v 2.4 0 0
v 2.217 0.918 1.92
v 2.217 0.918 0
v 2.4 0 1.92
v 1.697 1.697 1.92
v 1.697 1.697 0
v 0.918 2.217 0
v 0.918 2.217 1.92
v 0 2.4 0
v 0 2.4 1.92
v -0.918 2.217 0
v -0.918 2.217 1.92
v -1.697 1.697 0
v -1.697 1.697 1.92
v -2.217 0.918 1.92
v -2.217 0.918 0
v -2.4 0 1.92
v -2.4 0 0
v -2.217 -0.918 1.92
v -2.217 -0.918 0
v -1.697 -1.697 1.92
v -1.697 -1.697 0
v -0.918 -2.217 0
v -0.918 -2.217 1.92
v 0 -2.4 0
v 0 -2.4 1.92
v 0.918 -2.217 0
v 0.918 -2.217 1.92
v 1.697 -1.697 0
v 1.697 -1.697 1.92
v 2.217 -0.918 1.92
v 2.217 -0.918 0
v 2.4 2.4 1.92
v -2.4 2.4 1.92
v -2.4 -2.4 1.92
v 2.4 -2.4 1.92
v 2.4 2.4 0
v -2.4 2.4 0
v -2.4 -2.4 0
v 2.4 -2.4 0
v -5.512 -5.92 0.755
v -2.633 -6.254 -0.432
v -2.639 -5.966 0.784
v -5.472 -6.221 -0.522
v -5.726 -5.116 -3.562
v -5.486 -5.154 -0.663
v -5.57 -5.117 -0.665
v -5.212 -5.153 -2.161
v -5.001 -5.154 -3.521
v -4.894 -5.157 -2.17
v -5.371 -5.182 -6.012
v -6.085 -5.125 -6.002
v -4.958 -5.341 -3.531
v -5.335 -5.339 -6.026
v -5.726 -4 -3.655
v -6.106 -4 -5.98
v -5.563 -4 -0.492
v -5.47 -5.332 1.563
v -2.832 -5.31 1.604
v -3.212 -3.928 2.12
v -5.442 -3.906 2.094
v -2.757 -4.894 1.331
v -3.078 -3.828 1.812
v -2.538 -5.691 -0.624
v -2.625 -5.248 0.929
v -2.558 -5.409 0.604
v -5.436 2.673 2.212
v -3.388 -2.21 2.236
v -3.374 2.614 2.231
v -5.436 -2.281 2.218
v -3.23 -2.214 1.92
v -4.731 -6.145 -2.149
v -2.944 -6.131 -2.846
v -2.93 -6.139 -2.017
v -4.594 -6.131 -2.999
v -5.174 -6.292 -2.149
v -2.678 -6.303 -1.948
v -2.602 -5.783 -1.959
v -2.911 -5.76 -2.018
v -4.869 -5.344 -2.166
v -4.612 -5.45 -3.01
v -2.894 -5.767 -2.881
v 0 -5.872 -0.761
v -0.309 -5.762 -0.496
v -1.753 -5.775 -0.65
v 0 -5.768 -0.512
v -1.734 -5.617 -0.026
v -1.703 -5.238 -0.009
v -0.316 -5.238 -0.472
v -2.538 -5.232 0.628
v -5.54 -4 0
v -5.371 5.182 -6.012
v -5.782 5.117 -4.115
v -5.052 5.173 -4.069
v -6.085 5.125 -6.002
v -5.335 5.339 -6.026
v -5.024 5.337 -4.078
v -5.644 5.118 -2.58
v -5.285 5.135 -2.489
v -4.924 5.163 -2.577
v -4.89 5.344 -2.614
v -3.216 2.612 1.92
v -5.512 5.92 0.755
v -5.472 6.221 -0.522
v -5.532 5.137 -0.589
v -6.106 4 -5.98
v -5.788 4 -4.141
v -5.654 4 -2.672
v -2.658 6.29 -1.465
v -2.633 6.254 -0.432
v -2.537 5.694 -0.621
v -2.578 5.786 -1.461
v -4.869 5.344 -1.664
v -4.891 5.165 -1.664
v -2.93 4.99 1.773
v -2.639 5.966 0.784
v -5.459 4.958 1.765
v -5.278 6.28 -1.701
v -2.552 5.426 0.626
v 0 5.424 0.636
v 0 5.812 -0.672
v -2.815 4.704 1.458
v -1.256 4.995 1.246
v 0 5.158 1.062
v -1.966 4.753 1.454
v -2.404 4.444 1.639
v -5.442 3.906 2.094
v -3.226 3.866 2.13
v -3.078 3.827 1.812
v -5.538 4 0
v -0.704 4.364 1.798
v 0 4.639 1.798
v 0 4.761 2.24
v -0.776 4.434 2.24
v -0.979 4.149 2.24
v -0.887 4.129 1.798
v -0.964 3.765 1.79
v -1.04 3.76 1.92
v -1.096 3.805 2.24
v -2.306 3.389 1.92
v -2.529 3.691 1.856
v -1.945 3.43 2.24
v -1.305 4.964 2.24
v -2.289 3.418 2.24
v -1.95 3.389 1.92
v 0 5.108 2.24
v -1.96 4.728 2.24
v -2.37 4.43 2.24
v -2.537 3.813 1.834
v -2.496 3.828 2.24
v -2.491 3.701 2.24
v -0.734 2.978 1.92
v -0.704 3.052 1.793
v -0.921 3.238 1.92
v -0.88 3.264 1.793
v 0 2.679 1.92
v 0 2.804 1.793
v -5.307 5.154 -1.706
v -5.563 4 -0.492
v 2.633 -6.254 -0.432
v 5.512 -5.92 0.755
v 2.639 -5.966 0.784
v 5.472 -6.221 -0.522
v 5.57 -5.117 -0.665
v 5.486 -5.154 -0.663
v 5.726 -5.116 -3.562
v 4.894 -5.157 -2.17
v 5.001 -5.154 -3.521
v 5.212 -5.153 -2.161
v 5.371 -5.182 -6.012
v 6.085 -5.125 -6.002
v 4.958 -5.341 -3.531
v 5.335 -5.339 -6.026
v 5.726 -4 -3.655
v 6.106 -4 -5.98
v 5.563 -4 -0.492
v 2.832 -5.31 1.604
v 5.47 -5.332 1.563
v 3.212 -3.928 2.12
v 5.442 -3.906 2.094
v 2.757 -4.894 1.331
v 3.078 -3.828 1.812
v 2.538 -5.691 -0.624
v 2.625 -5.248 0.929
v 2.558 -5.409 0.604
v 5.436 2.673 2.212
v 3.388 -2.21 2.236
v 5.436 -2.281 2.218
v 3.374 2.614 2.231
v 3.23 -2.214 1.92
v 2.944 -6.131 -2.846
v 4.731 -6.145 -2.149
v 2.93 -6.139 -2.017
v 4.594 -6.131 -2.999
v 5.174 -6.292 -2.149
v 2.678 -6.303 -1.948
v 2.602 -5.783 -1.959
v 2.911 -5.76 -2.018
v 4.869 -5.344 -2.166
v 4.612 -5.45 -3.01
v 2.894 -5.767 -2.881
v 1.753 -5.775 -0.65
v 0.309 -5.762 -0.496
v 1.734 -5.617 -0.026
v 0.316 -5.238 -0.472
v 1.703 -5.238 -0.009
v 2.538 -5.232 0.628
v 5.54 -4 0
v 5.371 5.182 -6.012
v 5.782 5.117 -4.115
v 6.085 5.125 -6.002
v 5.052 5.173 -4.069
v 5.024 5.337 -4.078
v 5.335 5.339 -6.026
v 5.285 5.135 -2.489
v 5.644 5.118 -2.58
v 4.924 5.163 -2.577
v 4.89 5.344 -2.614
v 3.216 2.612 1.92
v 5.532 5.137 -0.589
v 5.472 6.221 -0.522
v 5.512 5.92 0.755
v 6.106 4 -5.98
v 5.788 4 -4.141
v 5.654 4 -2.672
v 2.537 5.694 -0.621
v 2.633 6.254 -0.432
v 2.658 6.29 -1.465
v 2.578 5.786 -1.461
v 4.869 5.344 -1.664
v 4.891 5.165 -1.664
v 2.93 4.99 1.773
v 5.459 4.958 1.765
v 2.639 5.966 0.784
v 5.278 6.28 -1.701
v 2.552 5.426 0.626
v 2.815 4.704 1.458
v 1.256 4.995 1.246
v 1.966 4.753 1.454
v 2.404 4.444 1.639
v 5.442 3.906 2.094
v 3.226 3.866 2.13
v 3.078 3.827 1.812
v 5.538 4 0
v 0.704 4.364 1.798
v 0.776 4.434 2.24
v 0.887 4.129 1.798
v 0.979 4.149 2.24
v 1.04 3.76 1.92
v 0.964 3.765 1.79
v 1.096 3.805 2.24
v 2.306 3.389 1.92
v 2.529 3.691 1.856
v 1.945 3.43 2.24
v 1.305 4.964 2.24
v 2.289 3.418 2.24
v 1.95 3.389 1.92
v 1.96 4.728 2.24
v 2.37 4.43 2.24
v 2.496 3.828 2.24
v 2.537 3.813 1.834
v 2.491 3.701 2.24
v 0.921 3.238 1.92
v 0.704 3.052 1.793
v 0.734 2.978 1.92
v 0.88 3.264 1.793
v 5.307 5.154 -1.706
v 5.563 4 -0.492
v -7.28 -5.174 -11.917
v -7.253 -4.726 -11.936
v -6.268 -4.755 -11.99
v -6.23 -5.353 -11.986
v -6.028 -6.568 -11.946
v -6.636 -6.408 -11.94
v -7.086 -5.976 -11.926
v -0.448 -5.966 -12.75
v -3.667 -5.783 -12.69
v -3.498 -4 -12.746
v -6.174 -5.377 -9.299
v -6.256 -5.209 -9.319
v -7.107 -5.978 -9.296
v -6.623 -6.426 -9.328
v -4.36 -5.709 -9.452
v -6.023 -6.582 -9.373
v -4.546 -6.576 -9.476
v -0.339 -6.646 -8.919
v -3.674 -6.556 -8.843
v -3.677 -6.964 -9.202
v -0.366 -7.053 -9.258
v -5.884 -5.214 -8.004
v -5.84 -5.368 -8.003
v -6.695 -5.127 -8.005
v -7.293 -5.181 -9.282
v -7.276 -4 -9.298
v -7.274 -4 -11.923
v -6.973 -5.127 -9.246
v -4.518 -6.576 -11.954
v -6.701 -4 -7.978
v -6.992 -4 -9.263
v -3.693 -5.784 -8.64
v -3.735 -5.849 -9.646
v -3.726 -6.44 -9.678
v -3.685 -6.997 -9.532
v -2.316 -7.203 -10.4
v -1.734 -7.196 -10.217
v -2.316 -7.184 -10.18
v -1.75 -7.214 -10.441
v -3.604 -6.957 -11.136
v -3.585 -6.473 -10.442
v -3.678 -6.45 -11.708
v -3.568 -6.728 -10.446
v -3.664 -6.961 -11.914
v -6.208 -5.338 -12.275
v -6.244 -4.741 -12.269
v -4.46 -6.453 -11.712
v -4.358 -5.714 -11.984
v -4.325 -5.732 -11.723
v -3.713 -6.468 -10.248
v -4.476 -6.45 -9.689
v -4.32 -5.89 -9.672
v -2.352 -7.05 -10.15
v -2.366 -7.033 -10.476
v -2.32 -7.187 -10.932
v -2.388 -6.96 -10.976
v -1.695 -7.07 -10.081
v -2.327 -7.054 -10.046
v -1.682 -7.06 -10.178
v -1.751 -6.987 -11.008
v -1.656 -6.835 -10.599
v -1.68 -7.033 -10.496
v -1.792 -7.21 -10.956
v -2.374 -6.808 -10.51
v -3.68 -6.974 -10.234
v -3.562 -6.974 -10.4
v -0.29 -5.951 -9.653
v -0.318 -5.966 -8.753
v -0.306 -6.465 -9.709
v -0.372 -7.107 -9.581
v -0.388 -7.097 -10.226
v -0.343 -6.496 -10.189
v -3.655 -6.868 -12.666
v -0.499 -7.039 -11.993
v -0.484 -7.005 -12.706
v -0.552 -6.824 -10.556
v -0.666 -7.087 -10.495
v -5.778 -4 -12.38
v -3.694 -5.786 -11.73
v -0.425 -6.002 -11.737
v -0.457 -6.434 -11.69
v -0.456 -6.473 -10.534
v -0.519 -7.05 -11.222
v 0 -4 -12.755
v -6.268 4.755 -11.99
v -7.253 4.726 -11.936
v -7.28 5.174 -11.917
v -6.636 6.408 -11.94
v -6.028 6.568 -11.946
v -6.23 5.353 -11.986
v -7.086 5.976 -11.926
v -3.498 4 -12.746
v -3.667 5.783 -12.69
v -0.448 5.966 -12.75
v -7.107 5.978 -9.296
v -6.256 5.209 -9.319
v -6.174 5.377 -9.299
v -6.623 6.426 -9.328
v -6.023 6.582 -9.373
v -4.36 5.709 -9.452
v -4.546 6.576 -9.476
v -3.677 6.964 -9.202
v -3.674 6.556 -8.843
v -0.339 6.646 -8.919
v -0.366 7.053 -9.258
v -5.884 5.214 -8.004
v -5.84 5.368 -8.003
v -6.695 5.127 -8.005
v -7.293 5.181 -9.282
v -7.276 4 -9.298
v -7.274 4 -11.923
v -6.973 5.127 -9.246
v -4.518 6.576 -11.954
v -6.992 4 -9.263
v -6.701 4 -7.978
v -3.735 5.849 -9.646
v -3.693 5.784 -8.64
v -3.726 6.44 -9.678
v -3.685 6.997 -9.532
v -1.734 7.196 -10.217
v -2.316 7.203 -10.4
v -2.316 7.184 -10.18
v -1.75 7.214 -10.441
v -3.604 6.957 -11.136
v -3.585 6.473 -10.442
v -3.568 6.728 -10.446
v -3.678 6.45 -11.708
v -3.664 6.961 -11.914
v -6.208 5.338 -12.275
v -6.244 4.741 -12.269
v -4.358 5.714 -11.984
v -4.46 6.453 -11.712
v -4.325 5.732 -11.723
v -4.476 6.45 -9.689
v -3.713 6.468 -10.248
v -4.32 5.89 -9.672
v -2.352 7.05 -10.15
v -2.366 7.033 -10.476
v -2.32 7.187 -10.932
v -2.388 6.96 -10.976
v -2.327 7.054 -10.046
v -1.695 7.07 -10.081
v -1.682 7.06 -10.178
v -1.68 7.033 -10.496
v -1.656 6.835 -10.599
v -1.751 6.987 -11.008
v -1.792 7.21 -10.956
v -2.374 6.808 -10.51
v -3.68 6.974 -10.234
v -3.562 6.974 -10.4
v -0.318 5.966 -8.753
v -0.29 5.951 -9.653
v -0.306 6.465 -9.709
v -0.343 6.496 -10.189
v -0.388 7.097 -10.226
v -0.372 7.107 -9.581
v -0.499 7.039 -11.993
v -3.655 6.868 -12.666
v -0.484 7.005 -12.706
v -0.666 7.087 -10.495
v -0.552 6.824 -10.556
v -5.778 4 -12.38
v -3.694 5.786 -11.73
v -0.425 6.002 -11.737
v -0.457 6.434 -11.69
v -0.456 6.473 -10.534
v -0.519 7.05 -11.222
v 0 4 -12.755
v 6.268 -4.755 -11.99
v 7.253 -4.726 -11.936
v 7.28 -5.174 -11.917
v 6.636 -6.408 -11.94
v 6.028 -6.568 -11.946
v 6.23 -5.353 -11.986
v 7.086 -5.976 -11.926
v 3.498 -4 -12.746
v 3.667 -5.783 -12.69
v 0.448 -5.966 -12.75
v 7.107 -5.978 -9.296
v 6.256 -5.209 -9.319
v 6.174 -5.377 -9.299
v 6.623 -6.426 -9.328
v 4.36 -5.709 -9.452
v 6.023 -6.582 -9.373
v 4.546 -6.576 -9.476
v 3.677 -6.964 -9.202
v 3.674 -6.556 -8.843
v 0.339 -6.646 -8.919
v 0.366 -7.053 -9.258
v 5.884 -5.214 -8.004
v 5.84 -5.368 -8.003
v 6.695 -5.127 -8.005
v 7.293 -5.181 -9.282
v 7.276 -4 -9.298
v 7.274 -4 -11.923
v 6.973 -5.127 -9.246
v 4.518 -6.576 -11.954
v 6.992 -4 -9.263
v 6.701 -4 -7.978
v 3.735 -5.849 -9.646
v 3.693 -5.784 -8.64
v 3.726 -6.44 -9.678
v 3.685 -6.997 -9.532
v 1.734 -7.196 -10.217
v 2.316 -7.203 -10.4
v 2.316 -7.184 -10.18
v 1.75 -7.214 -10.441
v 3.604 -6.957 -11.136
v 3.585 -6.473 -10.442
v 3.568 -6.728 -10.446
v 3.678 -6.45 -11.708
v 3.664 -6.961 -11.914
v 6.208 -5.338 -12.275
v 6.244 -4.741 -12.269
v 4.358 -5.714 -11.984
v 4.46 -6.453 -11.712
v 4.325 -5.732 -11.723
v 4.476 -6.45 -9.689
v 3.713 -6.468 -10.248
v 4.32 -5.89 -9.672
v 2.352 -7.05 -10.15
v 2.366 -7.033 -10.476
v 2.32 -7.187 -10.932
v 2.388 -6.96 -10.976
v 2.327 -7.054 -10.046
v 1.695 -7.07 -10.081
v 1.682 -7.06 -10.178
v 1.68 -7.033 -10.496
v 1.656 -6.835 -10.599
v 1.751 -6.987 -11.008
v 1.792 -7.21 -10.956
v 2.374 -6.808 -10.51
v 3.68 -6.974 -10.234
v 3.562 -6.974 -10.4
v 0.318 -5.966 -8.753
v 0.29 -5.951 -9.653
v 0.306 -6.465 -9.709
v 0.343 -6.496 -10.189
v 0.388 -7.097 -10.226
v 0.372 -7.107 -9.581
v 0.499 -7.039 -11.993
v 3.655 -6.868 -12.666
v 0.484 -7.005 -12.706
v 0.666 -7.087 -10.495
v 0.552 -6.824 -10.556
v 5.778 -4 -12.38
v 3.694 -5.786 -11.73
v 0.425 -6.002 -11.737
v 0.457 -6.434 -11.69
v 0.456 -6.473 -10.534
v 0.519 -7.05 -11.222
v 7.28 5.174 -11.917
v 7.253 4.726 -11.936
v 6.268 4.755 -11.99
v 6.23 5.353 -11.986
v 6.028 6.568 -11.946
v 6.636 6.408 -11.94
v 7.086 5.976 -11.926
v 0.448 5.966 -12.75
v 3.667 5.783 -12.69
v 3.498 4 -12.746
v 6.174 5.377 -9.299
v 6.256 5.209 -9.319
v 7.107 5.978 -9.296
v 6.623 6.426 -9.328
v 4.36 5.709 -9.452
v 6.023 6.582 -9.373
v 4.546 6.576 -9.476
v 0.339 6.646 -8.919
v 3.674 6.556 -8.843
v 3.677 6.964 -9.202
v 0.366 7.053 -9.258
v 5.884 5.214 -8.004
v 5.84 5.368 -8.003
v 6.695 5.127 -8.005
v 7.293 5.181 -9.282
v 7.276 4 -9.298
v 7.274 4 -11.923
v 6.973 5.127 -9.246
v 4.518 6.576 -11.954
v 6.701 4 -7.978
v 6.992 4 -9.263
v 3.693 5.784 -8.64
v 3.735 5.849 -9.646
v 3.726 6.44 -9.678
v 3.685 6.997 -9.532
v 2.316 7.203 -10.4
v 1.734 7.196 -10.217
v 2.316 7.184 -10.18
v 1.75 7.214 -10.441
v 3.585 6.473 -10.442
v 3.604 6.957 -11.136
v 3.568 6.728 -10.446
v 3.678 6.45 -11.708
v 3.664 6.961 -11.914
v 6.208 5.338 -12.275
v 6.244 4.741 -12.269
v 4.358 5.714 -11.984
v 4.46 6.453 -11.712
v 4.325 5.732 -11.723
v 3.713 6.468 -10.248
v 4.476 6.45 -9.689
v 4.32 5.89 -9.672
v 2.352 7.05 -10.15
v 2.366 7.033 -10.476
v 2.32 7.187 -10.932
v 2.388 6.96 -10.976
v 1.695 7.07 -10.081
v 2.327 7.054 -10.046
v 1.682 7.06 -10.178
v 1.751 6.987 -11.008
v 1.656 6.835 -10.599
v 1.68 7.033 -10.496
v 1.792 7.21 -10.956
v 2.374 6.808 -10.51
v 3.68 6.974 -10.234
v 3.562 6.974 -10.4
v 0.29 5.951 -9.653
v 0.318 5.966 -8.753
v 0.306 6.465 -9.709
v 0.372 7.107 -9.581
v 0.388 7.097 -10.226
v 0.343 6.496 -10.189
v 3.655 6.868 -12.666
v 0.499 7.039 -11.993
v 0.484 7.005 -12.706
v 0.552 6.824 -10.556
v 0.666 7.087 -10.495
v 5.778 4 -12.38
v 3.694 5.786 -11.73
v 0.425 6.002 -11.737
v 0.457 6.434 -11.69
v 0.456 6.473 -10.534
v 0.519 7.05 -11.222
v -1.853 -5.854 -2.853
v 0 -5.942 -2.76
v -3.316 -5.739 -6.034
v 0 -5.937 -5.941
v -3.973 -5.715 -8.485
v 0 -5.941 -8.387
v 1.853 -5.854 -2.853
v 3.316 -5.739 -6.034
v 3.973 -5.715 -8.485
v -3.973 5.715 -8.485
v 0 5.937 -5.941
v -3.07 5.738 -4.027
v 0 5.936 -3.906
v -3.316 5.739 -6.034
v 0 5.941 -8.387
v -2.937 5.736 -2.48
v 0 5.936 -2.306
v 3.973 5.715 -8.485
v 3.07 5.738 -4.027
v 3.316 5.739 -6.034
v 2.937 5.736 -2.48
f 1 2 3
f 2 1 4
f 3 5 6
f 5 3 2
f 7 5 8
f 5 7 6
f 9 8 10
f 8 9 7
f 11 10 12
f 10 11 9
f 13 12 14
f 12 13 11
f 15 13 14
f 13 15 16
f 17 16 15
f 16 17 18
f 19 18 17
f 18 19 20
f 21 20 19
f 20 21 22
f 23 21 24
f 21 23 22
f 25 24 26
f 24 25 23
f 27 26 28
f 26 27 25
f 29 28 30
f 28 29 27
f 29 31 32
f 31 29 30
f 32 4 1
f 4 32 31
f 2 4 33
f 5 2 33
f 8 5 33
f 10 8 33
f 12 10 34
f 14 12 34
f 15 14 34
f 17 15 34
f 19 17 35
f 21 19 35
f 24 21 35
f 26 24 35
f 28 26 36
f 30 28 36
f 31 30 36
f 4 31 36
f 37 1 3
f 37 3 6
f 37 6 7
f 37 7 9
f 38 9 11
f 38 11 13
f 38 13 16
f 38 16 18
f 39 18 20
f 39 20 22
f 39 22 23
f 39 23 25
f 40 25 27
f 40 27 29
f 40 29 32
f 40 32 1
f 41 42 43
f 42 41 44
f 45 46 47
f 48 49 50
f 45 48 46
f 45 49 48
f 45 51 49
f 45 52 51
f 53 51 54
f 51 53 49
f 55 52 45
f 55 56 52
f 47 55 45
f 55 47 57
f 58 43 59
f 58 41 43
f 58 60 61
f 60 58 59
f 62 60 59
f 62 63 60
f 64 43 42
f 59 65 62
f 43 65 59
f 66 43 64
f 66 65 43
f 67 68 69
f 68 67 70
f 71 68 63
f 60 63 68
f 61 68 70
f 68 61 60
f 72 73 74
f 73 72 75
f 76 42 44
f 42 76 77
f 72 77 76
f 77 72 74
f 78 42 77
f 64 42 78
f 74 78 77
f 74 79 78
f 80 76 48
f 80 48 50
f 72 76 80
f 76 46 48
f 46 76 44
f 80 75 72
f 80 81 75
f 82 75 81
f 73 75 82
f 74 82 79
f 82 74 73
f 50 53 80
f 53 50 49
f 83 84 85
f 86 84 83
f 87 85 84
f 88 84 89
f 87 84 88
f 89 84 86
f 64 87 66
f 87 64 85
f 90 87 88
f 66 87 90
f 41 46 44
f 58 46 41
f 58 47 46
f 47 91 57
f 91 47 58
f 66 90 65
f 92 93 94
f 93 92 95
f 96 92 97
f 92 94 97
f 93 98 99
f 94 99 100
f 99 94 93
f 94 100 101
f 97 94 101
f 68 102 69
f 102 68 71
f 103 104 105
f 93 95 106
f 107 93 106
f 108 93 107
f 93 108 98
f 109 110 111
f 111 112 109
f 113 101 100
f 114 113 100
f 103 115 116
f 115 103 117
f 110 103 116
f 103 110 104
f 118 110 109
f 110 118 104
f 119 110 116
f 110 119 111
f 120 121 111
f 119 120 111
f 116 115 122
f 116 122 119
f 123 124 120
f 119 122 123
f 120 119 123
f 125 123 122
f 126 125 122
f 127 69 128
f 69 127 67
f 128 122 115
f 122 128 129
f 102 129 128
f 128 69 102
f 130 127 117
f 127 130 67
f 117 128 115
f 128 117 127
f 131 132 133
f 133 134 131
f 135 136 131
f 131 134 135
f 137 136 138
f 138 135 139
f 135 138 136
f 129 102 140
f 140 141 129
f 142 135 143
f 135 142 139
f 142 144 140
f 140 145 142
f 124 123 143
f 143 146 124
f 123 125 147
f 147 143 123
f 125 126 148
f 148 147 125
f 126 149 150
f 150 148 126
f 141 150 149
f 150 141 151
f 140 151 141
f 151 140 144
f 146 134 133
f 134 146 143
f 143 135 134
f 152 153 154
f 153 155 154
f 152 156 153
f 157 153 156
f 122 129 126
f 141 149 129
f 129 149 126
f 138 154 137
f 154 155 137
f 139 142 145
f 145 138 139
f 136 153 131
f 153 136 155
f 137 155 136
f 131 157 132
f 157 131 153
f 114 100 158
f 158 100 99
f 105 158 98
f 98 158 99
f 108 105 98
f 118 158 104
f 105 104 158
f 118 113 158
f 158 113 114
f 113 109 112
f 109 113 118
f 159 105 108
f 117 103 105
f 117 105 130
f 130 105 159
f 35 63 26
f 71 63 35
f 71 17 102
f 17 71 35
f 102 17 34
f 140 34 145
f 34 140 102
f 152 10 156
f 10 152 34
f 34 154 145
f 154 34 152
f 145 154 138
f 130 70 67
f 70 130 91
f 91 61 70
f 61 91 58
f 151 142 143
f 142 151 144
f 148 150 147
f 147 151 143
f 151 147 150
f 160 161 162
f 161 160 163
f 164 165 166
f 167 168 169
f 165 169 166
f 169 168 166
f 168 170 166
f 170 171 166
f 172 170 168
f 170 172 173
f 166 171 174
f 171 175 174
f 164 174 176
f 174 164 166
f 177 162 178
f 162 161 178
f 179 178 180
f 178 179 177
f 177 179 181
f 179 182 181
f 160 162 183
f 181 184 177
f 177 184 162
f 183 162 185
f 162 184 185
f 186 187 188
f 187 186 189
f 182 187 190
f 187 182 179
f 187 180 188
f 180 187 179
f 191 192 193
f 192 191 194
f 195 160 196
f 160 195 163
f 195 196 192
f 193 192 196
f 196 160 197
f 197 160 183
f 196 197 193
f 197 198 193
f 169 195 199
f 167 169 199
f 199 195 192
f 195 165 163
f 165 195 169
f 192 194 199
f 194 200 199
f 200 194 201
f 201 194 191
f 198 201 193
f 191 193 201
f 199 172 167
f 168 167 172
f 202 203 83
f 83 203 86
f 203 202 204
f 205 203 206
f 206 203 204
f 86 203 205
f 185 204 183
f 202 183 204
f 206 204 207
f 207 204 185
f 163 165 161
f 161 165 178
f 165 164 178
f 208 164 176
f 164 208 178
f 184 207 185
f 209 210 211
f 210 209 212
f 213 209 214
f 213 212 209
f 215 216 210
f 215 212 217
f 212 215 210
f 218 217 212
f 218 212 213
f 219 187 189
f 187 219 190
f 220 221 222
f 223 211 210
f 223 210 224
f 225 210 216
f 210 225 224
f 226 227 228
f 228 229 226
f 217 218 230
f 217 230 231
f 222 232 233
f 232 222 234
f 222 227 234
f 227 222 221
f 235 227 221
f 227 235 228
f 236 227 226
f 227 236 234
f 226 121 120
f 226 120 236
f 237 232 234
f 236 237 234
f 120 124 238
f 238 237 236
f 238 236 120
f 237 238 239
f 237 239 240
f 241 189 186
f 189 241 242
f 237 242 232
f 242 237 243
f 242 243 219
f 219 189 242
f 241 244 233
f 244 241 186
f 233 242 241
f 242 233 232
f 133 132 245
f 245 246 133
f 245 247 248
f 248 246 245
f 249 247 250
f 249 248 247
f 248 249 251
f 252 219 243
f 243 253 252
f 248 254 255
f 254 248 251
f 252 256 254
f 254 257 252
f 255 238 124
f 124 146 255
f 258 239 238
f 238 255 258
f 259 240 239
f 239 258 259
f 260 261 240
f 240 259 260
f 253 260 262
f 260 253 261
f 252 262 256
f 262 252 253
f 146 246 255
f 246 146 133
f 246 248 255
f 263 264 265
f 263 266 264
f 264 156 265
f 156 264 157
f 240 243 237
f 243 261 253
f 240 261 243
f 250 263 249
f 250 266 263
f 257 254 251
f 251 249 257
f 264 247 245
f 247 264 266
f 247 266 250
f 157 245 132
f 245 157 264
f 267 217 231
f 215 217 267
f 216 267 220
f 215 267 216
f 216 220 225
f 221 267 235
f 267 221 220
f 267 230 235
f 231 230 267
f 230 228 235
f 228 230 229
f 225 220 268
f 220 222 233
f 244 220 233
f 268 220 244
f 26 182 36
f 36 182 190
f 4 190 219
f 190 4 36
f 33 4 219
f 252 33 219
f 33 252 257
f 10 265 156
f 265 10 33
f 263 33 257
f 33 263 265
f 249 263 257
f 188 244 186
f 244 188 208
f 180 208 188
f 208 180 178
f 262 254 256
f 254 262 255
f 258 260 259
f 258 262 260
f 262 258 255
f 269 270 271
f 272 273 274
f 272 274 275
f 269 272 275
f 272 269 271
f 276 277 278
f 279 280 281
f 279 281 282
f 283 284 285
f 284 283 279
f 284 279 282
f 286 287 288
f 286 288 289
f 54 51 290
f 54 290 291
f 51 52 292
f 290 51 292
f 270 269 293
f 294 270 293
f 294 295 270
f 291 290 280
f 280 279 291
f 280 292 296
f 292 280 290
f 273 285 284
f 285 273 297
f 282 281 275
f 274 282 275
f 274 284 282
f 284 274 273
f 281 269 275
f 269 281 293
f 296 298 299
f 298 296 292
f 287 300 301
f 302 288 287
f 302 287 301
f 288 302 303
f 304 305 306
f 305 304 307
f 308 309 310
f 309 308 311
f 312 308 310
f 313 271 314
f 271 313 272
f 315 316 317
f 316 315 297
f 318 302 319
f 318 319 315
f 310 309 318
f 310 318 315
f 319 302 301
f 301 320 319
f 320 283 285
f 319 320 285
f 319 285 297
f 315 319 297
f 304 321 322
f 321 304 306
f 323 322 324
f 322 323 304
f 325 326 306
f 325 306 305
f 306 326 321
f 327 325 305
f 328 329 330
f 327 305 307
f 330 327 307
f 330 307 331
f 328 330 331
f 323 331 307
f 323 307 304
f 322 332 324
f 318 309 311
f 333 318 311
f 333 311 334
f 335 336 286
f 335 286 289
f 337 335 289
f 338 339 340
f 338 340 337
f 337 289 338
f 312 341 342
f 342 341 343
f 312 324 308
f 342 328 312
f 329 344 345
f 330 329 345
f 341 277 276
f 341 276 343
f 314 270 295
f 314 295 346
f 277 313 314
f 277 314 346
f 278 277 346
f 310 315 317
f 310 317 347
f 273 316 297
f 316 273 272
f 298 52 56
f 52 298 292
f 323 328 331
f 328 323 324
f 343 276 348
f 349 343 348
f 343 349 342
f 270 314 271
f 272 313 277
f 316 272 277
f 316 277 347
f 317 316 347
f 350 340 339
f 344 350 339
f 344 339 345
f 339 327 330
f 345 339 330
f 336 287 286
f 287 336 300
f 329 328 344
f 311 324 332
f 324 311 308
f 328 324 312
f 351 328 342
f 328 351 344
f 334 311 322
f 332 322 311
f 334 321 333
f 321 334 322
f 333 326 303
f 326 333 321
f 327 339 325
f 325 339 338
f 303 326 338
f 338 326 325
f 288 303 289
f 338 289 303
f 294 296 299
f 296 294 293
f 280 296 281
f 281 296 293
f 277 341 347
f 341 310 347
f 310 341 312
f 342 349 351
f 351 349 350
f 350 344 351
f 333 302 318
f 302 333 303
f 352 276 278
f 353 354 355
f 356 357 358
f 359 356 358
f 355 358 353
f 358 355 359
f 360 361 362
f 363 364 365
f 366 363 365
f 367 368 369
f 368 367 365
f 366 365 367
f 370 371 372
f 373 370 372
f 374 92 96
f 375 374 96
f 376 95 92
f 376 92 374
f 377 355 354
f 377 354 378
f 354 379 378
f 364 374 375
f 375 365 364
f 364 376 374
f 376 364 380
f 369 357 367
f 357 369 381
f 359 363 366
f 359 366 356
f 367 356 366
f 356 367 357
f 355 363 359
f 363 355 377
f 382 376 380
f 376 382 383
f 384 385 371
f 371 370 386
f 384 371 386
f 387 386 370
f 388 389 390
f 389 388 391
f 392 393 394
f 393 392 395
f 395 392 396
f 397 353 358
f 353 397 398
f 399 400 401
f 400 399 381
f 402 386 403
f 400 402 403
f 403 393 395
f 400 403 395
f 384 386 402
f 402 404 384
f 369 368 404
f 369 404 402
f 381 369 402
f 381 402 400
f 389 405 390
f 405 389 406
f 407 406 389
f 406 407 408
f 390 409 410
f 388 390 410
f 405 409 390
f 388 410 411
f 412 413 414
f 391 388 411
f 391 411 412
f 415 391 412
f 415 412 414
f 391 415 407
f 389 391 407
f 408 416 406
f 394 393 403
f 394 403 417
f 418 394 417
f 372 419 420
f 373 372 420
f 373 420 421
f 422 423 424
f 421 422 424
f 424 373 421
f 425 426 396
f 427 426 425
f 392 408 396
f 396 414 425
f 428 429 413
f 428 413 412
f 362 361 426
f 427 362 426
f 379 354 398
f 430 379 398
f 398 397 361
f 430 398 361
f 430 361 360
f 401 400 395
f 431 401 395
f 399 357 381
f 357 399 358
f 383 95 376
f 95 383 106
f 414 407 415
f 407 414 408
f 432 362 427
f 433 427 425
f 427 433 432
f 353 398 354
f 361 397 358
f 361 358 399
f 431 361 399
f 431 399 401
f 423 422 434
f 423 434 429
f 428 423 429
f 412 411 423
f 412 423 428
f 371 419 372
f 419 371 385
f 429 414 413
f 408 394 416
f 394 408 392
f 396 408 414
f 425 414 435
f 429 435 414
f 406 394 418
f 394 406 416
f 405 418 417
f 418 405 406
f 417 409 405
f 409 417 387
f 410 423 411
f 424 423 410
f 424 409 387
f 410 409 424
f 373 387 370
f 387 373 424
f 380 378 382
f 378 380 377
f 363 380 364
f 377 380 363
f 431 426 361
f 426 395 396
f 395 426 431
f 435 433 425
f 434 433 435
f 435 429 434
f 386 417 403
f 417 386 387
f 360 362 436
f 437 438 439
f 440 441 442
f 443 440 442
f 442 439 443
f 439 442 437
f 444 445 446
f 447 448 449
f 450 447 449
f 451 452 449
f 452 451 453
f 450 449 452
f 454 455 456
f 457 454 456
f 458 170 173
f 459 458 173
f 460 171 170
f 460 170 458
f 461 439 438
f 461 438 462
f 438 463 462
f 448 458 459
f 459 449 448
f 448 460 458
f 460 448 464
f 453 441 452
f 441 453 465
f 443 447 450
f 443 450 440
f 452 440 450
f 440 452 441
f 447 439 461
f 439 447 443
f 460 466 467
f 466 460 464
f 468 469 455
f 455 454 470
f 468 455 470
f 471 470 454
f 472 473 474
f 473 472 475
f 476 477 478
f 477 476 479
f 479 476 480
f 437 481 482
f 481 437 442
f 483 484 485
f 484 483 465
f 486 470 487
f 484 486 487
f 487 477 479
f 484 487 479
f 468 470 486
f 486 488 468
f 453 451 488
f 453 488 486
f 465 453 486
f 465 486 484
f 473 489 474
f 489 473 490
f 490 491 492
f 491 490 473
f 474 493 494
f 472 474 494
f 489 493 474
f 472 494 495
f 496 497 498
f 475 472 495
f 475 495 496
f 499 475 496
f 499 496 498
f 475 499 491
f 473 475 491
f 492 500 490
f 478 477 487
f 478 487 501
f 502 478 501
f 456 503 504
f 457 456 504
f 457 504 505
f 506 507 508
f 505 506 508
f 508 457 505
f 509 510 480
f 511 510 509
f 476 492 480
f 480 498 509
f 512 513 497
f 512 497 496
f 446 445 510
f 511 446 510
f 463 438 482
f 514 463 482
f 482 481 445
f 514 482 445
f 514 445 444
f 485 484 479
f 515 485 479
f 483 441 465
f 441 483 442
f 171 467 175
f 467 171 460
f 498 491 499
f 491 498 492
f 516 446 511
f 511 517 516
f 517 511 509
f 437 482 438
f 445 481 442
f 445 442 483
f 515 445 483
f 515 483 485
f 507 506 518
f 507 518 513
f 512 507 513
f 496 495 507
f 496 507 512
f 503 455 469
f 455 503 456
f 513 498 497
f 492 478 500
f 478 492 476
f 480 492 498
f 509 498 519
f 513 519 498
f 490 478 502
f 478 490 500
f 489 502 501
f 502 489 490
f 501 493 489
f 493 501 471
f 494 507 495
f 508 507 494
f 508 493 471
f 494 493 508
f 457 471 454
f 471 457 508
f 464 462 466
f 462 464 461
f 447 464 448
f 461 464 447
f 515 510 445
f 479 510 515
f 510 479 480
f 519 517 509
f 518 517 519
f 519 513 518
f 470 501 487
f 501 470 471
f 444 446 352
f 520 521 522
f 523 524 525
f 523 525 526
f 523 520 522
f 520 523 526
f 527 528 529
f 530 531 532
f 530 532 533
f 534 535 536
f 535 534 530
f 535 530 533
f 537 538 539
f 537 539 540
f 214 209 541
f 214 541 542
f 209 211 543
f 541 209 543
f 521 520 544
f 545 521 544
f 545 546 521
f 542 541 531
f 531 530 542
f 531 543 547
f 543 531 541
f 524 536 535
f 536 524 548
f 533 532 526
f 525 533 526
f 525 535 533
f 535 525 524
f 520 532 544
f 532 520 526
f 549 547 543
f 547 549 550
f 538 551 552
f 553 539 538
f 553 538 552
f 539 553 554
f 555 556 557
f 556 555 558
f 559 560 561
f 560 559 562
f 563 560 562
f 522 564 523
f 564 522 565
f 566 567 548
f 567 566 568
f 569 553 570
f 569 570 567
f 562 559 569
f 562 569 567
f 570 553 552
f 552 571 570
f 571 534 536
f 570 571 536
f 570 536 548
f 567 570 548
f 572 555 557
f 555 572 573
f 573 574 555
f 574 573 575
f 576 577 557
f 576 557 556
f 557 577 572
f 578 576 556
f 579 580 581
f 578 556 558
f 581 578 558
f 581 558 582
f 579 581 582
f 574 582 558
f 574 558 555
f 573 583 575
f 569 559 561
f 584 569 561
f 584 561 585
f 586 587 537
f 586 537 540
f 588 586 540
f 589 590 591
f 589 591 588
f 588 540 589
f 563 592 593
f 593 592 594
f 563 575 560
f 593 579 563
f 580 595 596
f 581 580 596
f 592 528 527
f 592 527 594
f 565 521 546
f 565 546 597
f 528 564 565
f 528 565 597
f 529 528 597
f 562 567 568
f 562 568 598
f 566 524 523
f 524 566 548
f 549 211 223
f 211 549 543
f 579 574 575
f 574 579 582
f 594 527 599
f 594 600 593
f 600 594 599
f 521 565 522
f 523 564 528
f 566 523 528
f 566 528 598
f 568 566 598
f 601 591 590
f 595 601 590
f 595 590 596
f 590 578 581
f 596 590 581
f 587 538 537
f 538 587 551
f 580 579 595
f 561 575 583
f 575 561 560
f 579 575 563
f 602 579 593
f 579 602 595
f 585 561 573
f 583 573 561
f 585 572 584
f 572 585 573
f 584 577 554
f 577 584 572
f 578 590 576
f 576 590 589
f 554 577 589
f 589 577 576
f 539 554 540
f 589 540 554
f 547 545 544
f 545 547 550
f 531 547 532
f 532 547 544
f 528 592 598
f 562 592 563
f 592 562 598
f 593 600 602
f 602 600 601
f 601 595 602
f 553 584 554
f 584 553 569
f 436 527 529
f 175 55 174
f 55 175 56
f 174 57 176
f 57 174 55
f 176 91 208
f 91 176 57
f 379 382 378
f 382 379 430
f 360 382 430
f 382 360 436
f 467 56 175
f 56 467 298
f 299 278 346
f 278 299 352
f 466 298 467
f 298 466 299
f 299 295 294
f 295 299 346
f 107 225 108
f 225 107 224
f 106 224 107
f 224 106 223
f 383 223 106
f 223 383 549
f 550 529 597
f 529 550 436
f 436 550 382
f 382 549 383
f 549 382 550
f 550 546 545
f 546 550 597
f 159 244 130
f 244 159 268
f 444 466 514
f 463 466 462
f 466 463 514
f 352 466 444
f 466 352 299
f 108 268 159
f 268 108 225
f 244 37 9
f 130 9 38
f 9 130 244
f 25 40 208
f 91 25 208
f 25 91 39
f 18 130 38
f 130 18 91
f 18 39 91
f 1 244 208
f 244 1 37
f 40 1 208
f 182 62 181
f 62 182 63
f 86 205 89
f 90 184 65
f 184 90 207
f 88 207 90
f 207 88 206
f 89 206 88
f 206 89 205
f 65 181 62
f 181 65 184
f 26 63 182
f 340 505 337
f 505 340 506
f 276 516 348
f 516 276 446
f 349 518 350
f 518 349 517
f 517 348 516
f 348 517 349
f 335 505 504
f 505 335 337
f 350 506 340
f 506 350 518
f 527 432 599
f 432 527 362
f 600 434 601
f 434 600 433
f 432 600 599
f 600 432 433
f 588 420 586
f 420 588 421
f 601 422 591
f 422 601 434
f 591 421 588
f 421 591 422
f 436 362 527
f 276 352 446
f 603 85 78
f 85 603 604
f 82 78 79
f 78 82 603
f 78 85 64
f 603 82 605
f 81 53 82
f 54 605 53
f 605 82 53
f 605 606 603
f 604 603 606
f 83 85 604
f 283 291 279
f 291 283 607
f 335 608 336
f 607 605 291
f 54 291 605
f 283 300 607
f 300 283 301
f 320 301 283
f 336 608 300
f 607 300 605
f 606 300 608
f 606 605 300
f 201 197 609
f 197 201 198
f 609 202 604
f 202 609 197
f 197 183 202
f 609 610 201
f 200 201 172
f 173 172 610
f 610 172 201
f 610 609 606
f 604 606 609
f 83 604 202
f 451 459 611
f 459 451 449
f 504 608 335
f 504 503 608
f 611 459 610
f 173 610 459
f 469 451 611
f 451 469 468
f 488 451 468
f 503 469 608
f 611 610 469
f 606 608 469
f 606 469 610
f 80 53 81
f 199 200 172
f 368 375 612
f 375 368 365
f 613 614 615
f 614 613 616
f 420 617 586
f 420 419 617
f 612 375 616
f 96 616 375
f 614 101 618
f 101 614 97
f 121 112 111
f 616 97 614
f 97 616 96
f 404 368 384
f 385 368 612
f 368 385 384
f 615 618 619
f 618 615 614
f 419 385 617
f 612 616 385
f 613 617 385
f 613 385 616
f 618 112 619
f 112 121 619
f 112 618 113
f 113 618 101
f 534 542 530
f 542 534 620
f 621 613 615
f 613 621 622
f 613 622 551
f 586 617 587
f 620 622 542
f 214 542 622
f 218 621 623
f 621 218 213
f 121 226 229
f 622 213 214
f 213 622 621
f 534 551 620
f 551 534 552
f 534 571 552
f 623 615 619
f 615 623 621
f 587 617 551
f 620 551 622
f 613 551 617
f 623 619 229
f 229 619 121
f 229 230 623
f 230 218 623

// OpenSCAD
use <../lib.scad>
use <s/15423s01.scad>
$fa=1; $fs=0.2;
function ldraw_lib__15423(realsolid=false) = [
// 0 Minifig Body Armour Vest
// 0 Name: 15423.dat
// 0 Author: Evert-Jan Boer [ejboer]
// 0 !LDRAW_ORG Part UPDATE 2023-01
// 0 !LICENSE Licensed under CC BY 2.0 and CC BY 4.0 : see CAreadme.txt
// 
// 0 BFC CERTIFY CCW
  [0,"BFC","CERTIFY"],
  [0,"BFC","CCW"],
// 
// 0 !CATEGORY Minifig Neckwear
// 
// 0 !HISTORY 2014-05-16 {LEGO Digital Designer} Original part shape
// 0 !HISTORY 2021-02-11 [ejboer] File preparation for LDraw Parts Tracker
// 0 !HISTORY 2023-03-05 [OrionP] Official Update 2023-01
// 
// 
// 1 16 0 0 0 1 0 0 0 1 0 0 0 1 s\15423s01.dat
  [1,16,0,0,0,1,0,0,0,1,0,0,0,1, ldraw_lib__s__15423s01(realsolid)],
// 0 // Patternable Area Front
// 4 16 0 6.899 -14.855 -4.383 1.626 -14.438 -6.506 4.897 -14.457 -4.632 7.133 -14.636
  [4,16,0,6.899,-14.855,-4.383,1.626,-14.438,-6.506,4.897,-14.457,-4.632,7.133,-14.636],
// 4 16 -7.277 5.044 -14.4 -7.236 7.203 -14.418 -4.632 7.133 -14.636 -6.506 4.897 -14.457
  [4,16,-7.277,5.044,-14.4,-7.236,7.203,-14.418,-4.632,7.133,-14.636,-6.506,4.897,-14.457],
// 3 16 -6.506 4.897 -14.457 -4.383 1.626 -14.438 -6.345 1.561 -14.227
  [3,16,-6.506,4.897,-14.457,-4.383,1.626,-14.438,-6.345,1.561,-14.227],
// 3 16 -4.632 7.133 -14.636 -7.236 7.203 -14.418 -8.291 15.084 -14.347
  [3,16,-4.632,7.133,-14.636,-7.236,7.203,-14.418,-8.291,15.084,-14.347],
// 3 16 -11.529 7.526 -13.626 -12.395 8.827 -13.353 -7.236 7.203 -14.418
  [3,16,-11.529,7.526,-13.626,-12.395,8.827,-13.353,-7.236,7.203,-14.418],
// 3 16 -13.337 15.066 -13.348 -8.291 15.084 -14.347 -12.395 8.827 -13.353
  [3,16,-13.337,15.066,-13.348,-8.291,15.084,-14.347,-12.395,8.827,-13.353],
// 3 16 -8.291 15.084 -14.347 -7.236 7.203 -14.418 -12.395 8.827 -13.353
  [3,16,-8.291,15.084,-14.347,-7.236,7.203,-14.418,-12.395,8.827,-13.353],
// 3 16 -8.291 15.084 -14.347 0 14.852 -14.842 -4.632 7.133 -14.636
  [3,16,-8.291,15.084,-14.347,0,14.852,-14.842,-4.632,7.133,-14.636],
// 3 16 0 6.899 -14.855 -4.632 7.133 -14.636 0 14.852 -14.842
  [3,16,0,6.899,-14.855,-4.632,7.133,-14.636,0,14.852,-14.842],
// 3 16 0 1.902 -14.679 -4.383 1.626 -14.438 0 6.899 -14.855
  [3,16,0,1.902,-14.679,-4.383,1.626,-14.438,0,6.899,-14.855],
// 4 16 -10.899 23.631 -14.272 -9.932 21.212 -14.287 -14.6 20.008 -13.419 -15.436 23.247 -13.442
  [4,16,-10.899,23.631,-14.272,-9.932,21.212,-14.287,-14.6,20.008,-13.419,-15.436,23.247,-13.442],
// 3 16 -.724 24.133 -14.877 0 20.968 -14.852 -.794 21.882 -14.916
  [3,16,-.724,24.133,-14.877,0,20.968,-14.852,-.794,21.882,-14.916],
// 3 16 -9.932 21.212 -14.287 -8.291 15.084 -14.347 -14.6 20.008 -13.419
  [3,16,-9.932,21.212,-14.287,-8.291,15.084,-14.347,-14.6,20.008,-13.419],
// 3 16 -13.337 15.066 -13.348 -14.6 20.008 -13.419 -8.291 15.084 -14.347
  [3,16,-13.337,15.066,-13.348,-14.6,20.008,-13.419,-8.291,15.084,-14.347],
// 4 16 -9.337 24.115 -14.622 -9.232 21.6 -14.46 -9.932 21.212 -14.287 -10.899 23.631 -14.272
  [4,16,-9.337,24.115,-14.622,-9.232,21.6,-14.46,-9.932,21.212,-14.287,-10.899,23.631,-14.272],
// 3 16 -10.8 24.18 -14.726 -9.337 24.115 -14.622 -10.899 23.631 -14.272
  [3,16,-10.8,24.18,-14.726,-9.337,24.115,-14.622,-10.899,23.631,-14.272],
// 3 16 -.794 21.882 -14.916 0 20.968 -14.852 -9.232 21.6 -14.46
  [3,16,-.794,21.882,-14.916,0,20.968,-14.852,-9.232,21.6,-14.46],
// 3 16 -9.932 21.212 -14.287 -9.232 21.6 -14.46 -8.291 15.084 -14.347
  [3,16,-9.932,21.212,-14.287,-9.232,21.6,-14.46,-8.291,15.084,-14.347],
// 3 16 0 14.852 -14.842 -9.232 21.6 -14.46 0 20.968 -14.852
  [3,16,0,14.852,-14.842,-9.232,21.6,-14.46,0,20.968,-14.852],
// 3 16 0 14.852 -14.842 -8.291 15.084 -14.347 -9.232 21.6 -14.46
  [3,16,0,14.852,-14.842,-8.291,15.084,-14.347,-9.232,21.6,-14.46],
// 4 16 4.632 7.133 -14.636 7.236 7.203 -14.418 7.277 5.044 -14.4 6.506 4.897 -14.457
  [4,16,4.632,7.133,-14.636,7.236,7.203,-14.418,7.277,5.044,-14.4,6.506,4.897,-14.457],
// 4 16 0 6.899 -14.855 4.632 7.133 -14.636 6.506 4.897 -14.457 4.383 1.626 -14.438
  [4,16,0,6.899,-14.855,4.632,7.133,-14.636,6.506,4.897,-14.457,4.383,1.626,-14.438],
// 3 16 6.506 4.897 -14.457 6.345 1.561 -14.227 4.383 1.626 -14.438
  [3,16,6.506,4.897,-14.457,6.345,1.561,-14.227,4.383,1.626,-14.438],
// 3 16 4.632 7.133 -14.636 8.291 15.084 -14.347 7.236 7.203 -14.418
  [3,16,4.632,7.133,-14.636,8.291,15.084,-14.347,7.236,7.203,-14.418],
// 3 16 11.529 7.526 -13.626 7.236 7.203 -14.418 12.395 8.827 -13.353
  [3,16,11.529,7.526,-13.626,7.236,7.203,-14.418,12.395,8.827,-13.353],
// 3 16 13.337 15.066 -13.348 12.395 8.827 -13.353 8.291 15.084 -14.347
  [3,16,13.337,15.066,-13.348,12.395,8.827,-13.353,8.291,15.084,-14.347],
// 3 16 8.291 15.084 -14.347 12.395 8.827 -13.353 7.236 7.203 -14.418
  [3,16,8.291,15.084,-14.347,12.395,8.827,-13.353,7.236,7.203,-14.418],
// 3 16 8.291 15.084 -14.347 4.632 7.133 -14.636 0 14.852 -14.842
  [3,16,8.291,15.084,-14.347,4.632,7.133,-14.636,0,14.852,-14.842],
// 3 16 0 6.899 -14.855 0 14.852 -14.842 4.632 7.133 -14.636
  [3,16,0,6.899,-14.855,0,14.852,-14.842,4.632,7.133,-14.636],
// 3 16 0 1.902 -14.679 0 6.899 -14.855 4.383 1.626 -14.438
  [3,16,0,1.902,-14.679,0,6.899,-14.855,4.383,1.626,-14.438],
// 4 16 10.899 23.631 -14.272 15.436 23.247 -13.442 14.6 20.008 -13.419 9.932 21.212 -14.287
  [4,16,10.899,23.631,-14.272,15.436,23.247,-13.442,14.6,20.008,-13.419,9.932,21.212,-14.287],
// 3 16 .724 24.133 -14.877 0 20.968 -14.852 -.724 24.133 -14.877
  [3,16,.724,24.133,-14.877,0,20.968,-14.852,-.724,24.133,-14.877],
// 3 16 .724 24.133 -14.877 .794 21.882 -14.916 0 20.968 -14.852
  [3,16,.724,24.133,-14.877,.794,21.882,-14.916,0,20.968,-14.852],
// 3 16 9.932 21.212 -14.287 14.6 20.008 -13.419 8.291 15.084 -14.347
  [3,16,9.932,21.212,-14.287,14.6,20.008,-13.419,8.291,15.084,-14.347],
// 3 16 13.337 15.066 -13.348 8.291 15.084 -14.347 14.6 20.008 -13.419
  [3,16,13.337,15.066,-13.348,8.291,15.084,-14.347,14.6,20.008,-13.419],
// 4 16 9.337 24.115 -14.622 10.899 23.631 -14.272 9.932 21.212 -14.287 9.232 21.6 -14.46
  [4,16,9.337,24.115,-14.622,10.899,23.631,-14.272,9.932,21.212,-14.287,9.232,21.6,-14.46],
// 3 16 10.8 24.18 -14.726 10.899 23.631 -14.272 9.337 24.115 -14.622
  [3,16,10.8,24.18,-14.726,10.899,23.631,-14.272,9.337,24.115,-14.622],
// 3 16 .794 21.882 -14.916 9.232 21.6 -14.46 0 20.968 -14.852
  [3,16,.794,21.882,-14.916,9.232,21.6,-14.46,0,20.968,-14.852],
// 3 16 9.932 21.212 -14.287 8.291 15.084 -14.347 9.232 21.6 -14.46
  [3,16,9.932,21.212,-14.287,8.291,15.084,-14.347,9.232,21.6,-14.46],
// 3 16 0 14.852 -14.842 0 20.968 -14.852 9.232 21.6 -14.46
  [3,16,0,14.852,-14.842,0,20.968,-14.852,9.232,21.6,-14.46],
// 3 16 0 14.852 -14.842 9.232 21.6 -14.46 8.291 15.084 -14.347
  [3,16,0,14.852,-14.842,9.232,21.6,-14.46,8.291,15.084,-14.347],
// 3 16 -12.172 5.414 -13.361 -12.395 8.827 -13.353 -11.529 7.526 -13.626
  [3,16,-12.172,5.414,-13.361,-12.395,8.827,-13.353,-11.529,7.526,-13.626],
// 3 16 12.172 5.414 -13.361 11.529 7.526 -13.626 12.395 8.827 -13.353
  [3,16,12.172,5.414,-13.361,11.529,7.526,-13.626,12.395,8.827,-13.353],
// 0 // Patternable Area Back
// 4 16 -14.6 20.008 13.419 -9.932 21.212 14.287 -10.899 23.631 14.272 -15.436 23.247 13.442
  [4,16,-14.6,20.008,13.419,-9.932,21.212,14.287,-10.899,23.631,14.272,-15.436,23.247,13.442],
// 4 16 0 14.852 14.842 -8.291 15.084 14.347 -7.675 10.068 14.345 0 9.765 14.841
  [4,16,0,14.852,14.842,-8.291,15.084,14.347,-7.675,10.068,14.345,0,9.765,14.841],
// 3 16 -.724 24.133 14.877 0 20.968 14.852 .724 24.133 14.877
  [3,16,-.724,24.133,14.877,0,20.968,14.852,.724,24.133,14.877],
// 3 16 -.724 24.133 14.877 -.794 21.882 14.916 0 20.968 14.852
  [3,16,-.724,24.133,14.877,-.794,21.882,14.916,0,20.968,14.852],
// 3 16 -9.932 21.212 14.287 -14.6 20.008 13.419 -8.291 15.084 14.347
  [3,16,-9.932,21.212,14.287,-14.6,20.008,13.419,-8.291,15.084,14.347],
// 3 16 -13.337 15.066 13.348 -8.291 15.084 14.347 -14.6 20.008 13.419
  [3,16,-13.337,15.066,13.348,-8.291,15.084,14.347,-14.6,20.008,13.419],
// 4 16 -7.675 10.068 14.345 -12.56 10.194 13.343 -12.224 6.535 13.359 -7.343 6.199 14.341
  [4,16,-7.675,10.068,14.345,-12.56,10.194,13.343,-12.224,6.535,13.359,-7.343,6.199,14.341],
// 3 16 0 1.68 14.529 -6.446 3.653 14.466 -6.343 1.552 14.234
  [3,16,0,1.68,14.529,-6.446,3.653,14.466,-6.343,1.552,14.234],
// 4 16 -8.291 15.084 14.347 -13.337 15.066 13.348 -12.56 10.194 13.343 -7.675 10.068 14.345
  [4,16,-8.291,15.084,14.347,-13.337,15.066,13.348,-12.56,10.194,13.343,-7.675,10.068,14.345],
// 3 16 -10.8 24.18 14.726 -10.899 23.631 14.272 -9.337 24.115 14.622
  [3,16,-10.8,24.18,14.726,-10.899,23.631,14.272,-9.337,24.115,14.622],
// 4 16 -9.932 21.212 14.287 -9.232 21.6 14.46 -9.337 24.115 14.622 -10.899 23.631 14.272
  [4,16,-9.932,21.212,14.287,-9.232,21.6,14.46,-9.337,24.115,14.622,-10.899,23.631,14.272],
// 4 16 -7.343 6.199 14.341 0 5.765 14.841 0 9.765 14.841 -7.675 10.068 14.345
  [4,16,-7.343,6.199,14.341,0,5.765,14.841,0,9.765,14.841,-7.675,10.068,14.345],
// 3 16 -.794 21.882 14.916 -9.232 21.6 14.46 0 20.968 14.852
  [3,16,-.794,21.882,14.916,-9.232,21.6,14.46,0,20.968,14.852],
// 3 16 -9.932 21.212 14.287 -8.291 15.084 14.347 -9.232 21.6 14.46
  [3,16,-9.932,21.212,14.287,-8.291,15.084,14.347,-9.232,21.6,14.46],
// 3 16 0 14.852 14.842 0 20.968 14.852 -9.232 21.6 14.46
  [3,16,0,14.852,14.842,0,20.968,14.852,-9.232,21.6,14.46],
// 3 16 0 14.852 14.842 -9.232 21.6 14.46 -8.291 15.084 14.347
  [3,16,0,14.852,14.842,-9.232,21.6,14.46,-8.291,15.084,14.347],
// 3 16 -7.343 6.199 14.341 -6.446 3.653 14.466 0 5.765 14.841
  [3,16,-7.343,6.199,14.341,-6.446,3.653,14.466,0,5.765,14.841],
// 3 16 -6.446 3.653 14.466 0 1.68 14.529 0 5.765 14.841
  [3,16,-6.446,3.653,14.466,0,1.68,14.529,0,5.765,14.841],
// 3 16 -6.446 3.653 14.466 -7.343 6.199 14.341 -12.172 4.16 13.361
  [3,16,-6.446,3.653,14.466,-7.343,6.199,14.341,-12.172,4.16,13.361],
// 3 16 -12.172 4.16 13.361 -7.343 6.199 14.341 -12.224 6.535 13.359
  [3,16,-12.172,4.16,13.361,-7.343,6.199,14.341,-12.224,6.535,13.359],
// 4 16 10.899 23.631 14.272 9.932 21.212 14.287 14.6 20.008 13.419 15.436 23.247 13.442
  [4,16,10.899,23.631,14.272,9.932,21.212,14.287,14.6,20.008,13.419,15.436,23.247,13.442],
// 4 16 0 14.852 14.842 0 9.765 14.841 7.675 10.068 14.345 8.291 15.084 14.347
  [4,16,0,14.852,14.842,0,9.765,14.841,7.675,10.068,14.345,8.291,15.084,14.347],
// 3 16 0 14.852 14.842 8.291 15.084 14.347 9.232 21.6 14.46
  [3,16,0,14.852,14.842,8.291,15.084,14.347,9.232,21.6,14.46],
// 3 16 .724 24.133 14.877 0 20.968 14.852 .794 21.882 14.916
  [3,16,.724,24.133,14.877,0,20.968,14.852,.794,21.882,14.916],
// 3 16 9.932 21.212 14.287 8.291 15.084 14.347 14.6 20.008 13.419
  [3,16,9.932,21.212,14.287,8.291,15.084,14.347,14.6,20.008,13.419],
// 3 16 13.337 15.066 13.348 14.6 20.008 13.419 8.291 15.084 14.347
  [3,16,13.337,15.066,13.348,14.6,20.008,13.419,8.291,15.084,14.347],
// 4 16 12.224 6.535 13.359 12.56 10.194 13.343 7.675 10.068 14.345 7.343 6.199 14.341
  [4,16,12.224,6.535,13.359,12.56,10.194,13.343,7.675,10.068,14.345,7.343,6.199,14.341],
// 3 16 0 1.68 14.529 6.343 1.552 14.234 6.446 3.653 14.466
  [3,16,0,1.68,14.529,6.343,1.552,14.234,6.446,3.653,14.466],
// 4 16 8.291 15.084 14.347 7.675 10.068 14.345 12.56 10.194 13.343 13.337 15.066 13.348
  [4,16,8.291,15.084,14.347,7.675,10.068,14.345,12.56,10.194,13.343,13.337,15.066,13.348],
// 4 16 10.899 23.631 14.272 9.337 24.115 14.622 9.232 21.6 14.46 9.932 21.212 14.287
  [4,16,10.899,23.631,14.272,9.337,24.115,14.622,9.232,21.6,14.46,9.932,21.212,14.287],
// 3 16 10.899 23.631 14.272 10.8 24.18 14.726 9.337 24.115 14.622
  [3,16,10.899,23.631,14.272,10.8,24.18,14.726,9.337,24.115,14.622],
// 4 16 0 9.765 14.841 0 5.765 14.841 7.343 6.199 14.341 7.675 10.068 14.345
  [4,16,0,9.765,14.841,0,5.765,14.841,7.343,6.199,14.341,7.675,10.068,14.345],
// 3 16 .794 21.882 14.916 0 20.968 14.852 9.232 21.6 14.46
  [3,16,.794,21.882,14.916,0,20.968,14.852,9.232,21.6,14.46],
// 3 16 9.932 21.212 14.287 9.232 21.6 14.46 8.291 15.084 14.347
  [3,16,9.932,21.212,14.287,9.232,21.6,14.46,8.291,15.084,14.347],
// 3 16 0 14.852 14.842 9.232 21.6 14.46 0 20.968 14.852
  [3,16,0,14.852,14.842,9.232,21.6,14.46,0,20.968,14.852],
// 3 16 7.343 6.199 14.341 0 5.765 14.841 6.446 3.653 14.466
  [3,16,7.343,6.199,14.341,0,5.765,14.841,6.446,3.653,14.466],
// 3 16 6.446 3.653 14.466 0 5.765 14.841 0 1.68 14.529
  [3,16,6.446,3.653,14.466,0,5.765,14.841,0,1.68,14.529],
// 3 16 6.446 3.653 14.466 12.172 4.16 13.361 7.343 6.199 14.341
  [3,16,6.446,3.653,14.466,12.172,4.16,13.361,7.343,6.199,14.341],
// 3 16 12.172 4.16 13.361 12.224 6.535 13.359 7.343 6.199 14.341
  [3,16,12.172,4.16,13.361,12.224,6.535,13.359,7.343,6.199,14.341],
];
module ldraw_lib__15423(step=0, col=false, unit=2/5, alt=false, line=0.2, solid=!$preview)
    makepoly(ldraw_lib__15423(solid), step=step, col=col, unit=unit, alt=alt, line=line, solid=solid);
ldraw_lib__15423(line=0.2);
